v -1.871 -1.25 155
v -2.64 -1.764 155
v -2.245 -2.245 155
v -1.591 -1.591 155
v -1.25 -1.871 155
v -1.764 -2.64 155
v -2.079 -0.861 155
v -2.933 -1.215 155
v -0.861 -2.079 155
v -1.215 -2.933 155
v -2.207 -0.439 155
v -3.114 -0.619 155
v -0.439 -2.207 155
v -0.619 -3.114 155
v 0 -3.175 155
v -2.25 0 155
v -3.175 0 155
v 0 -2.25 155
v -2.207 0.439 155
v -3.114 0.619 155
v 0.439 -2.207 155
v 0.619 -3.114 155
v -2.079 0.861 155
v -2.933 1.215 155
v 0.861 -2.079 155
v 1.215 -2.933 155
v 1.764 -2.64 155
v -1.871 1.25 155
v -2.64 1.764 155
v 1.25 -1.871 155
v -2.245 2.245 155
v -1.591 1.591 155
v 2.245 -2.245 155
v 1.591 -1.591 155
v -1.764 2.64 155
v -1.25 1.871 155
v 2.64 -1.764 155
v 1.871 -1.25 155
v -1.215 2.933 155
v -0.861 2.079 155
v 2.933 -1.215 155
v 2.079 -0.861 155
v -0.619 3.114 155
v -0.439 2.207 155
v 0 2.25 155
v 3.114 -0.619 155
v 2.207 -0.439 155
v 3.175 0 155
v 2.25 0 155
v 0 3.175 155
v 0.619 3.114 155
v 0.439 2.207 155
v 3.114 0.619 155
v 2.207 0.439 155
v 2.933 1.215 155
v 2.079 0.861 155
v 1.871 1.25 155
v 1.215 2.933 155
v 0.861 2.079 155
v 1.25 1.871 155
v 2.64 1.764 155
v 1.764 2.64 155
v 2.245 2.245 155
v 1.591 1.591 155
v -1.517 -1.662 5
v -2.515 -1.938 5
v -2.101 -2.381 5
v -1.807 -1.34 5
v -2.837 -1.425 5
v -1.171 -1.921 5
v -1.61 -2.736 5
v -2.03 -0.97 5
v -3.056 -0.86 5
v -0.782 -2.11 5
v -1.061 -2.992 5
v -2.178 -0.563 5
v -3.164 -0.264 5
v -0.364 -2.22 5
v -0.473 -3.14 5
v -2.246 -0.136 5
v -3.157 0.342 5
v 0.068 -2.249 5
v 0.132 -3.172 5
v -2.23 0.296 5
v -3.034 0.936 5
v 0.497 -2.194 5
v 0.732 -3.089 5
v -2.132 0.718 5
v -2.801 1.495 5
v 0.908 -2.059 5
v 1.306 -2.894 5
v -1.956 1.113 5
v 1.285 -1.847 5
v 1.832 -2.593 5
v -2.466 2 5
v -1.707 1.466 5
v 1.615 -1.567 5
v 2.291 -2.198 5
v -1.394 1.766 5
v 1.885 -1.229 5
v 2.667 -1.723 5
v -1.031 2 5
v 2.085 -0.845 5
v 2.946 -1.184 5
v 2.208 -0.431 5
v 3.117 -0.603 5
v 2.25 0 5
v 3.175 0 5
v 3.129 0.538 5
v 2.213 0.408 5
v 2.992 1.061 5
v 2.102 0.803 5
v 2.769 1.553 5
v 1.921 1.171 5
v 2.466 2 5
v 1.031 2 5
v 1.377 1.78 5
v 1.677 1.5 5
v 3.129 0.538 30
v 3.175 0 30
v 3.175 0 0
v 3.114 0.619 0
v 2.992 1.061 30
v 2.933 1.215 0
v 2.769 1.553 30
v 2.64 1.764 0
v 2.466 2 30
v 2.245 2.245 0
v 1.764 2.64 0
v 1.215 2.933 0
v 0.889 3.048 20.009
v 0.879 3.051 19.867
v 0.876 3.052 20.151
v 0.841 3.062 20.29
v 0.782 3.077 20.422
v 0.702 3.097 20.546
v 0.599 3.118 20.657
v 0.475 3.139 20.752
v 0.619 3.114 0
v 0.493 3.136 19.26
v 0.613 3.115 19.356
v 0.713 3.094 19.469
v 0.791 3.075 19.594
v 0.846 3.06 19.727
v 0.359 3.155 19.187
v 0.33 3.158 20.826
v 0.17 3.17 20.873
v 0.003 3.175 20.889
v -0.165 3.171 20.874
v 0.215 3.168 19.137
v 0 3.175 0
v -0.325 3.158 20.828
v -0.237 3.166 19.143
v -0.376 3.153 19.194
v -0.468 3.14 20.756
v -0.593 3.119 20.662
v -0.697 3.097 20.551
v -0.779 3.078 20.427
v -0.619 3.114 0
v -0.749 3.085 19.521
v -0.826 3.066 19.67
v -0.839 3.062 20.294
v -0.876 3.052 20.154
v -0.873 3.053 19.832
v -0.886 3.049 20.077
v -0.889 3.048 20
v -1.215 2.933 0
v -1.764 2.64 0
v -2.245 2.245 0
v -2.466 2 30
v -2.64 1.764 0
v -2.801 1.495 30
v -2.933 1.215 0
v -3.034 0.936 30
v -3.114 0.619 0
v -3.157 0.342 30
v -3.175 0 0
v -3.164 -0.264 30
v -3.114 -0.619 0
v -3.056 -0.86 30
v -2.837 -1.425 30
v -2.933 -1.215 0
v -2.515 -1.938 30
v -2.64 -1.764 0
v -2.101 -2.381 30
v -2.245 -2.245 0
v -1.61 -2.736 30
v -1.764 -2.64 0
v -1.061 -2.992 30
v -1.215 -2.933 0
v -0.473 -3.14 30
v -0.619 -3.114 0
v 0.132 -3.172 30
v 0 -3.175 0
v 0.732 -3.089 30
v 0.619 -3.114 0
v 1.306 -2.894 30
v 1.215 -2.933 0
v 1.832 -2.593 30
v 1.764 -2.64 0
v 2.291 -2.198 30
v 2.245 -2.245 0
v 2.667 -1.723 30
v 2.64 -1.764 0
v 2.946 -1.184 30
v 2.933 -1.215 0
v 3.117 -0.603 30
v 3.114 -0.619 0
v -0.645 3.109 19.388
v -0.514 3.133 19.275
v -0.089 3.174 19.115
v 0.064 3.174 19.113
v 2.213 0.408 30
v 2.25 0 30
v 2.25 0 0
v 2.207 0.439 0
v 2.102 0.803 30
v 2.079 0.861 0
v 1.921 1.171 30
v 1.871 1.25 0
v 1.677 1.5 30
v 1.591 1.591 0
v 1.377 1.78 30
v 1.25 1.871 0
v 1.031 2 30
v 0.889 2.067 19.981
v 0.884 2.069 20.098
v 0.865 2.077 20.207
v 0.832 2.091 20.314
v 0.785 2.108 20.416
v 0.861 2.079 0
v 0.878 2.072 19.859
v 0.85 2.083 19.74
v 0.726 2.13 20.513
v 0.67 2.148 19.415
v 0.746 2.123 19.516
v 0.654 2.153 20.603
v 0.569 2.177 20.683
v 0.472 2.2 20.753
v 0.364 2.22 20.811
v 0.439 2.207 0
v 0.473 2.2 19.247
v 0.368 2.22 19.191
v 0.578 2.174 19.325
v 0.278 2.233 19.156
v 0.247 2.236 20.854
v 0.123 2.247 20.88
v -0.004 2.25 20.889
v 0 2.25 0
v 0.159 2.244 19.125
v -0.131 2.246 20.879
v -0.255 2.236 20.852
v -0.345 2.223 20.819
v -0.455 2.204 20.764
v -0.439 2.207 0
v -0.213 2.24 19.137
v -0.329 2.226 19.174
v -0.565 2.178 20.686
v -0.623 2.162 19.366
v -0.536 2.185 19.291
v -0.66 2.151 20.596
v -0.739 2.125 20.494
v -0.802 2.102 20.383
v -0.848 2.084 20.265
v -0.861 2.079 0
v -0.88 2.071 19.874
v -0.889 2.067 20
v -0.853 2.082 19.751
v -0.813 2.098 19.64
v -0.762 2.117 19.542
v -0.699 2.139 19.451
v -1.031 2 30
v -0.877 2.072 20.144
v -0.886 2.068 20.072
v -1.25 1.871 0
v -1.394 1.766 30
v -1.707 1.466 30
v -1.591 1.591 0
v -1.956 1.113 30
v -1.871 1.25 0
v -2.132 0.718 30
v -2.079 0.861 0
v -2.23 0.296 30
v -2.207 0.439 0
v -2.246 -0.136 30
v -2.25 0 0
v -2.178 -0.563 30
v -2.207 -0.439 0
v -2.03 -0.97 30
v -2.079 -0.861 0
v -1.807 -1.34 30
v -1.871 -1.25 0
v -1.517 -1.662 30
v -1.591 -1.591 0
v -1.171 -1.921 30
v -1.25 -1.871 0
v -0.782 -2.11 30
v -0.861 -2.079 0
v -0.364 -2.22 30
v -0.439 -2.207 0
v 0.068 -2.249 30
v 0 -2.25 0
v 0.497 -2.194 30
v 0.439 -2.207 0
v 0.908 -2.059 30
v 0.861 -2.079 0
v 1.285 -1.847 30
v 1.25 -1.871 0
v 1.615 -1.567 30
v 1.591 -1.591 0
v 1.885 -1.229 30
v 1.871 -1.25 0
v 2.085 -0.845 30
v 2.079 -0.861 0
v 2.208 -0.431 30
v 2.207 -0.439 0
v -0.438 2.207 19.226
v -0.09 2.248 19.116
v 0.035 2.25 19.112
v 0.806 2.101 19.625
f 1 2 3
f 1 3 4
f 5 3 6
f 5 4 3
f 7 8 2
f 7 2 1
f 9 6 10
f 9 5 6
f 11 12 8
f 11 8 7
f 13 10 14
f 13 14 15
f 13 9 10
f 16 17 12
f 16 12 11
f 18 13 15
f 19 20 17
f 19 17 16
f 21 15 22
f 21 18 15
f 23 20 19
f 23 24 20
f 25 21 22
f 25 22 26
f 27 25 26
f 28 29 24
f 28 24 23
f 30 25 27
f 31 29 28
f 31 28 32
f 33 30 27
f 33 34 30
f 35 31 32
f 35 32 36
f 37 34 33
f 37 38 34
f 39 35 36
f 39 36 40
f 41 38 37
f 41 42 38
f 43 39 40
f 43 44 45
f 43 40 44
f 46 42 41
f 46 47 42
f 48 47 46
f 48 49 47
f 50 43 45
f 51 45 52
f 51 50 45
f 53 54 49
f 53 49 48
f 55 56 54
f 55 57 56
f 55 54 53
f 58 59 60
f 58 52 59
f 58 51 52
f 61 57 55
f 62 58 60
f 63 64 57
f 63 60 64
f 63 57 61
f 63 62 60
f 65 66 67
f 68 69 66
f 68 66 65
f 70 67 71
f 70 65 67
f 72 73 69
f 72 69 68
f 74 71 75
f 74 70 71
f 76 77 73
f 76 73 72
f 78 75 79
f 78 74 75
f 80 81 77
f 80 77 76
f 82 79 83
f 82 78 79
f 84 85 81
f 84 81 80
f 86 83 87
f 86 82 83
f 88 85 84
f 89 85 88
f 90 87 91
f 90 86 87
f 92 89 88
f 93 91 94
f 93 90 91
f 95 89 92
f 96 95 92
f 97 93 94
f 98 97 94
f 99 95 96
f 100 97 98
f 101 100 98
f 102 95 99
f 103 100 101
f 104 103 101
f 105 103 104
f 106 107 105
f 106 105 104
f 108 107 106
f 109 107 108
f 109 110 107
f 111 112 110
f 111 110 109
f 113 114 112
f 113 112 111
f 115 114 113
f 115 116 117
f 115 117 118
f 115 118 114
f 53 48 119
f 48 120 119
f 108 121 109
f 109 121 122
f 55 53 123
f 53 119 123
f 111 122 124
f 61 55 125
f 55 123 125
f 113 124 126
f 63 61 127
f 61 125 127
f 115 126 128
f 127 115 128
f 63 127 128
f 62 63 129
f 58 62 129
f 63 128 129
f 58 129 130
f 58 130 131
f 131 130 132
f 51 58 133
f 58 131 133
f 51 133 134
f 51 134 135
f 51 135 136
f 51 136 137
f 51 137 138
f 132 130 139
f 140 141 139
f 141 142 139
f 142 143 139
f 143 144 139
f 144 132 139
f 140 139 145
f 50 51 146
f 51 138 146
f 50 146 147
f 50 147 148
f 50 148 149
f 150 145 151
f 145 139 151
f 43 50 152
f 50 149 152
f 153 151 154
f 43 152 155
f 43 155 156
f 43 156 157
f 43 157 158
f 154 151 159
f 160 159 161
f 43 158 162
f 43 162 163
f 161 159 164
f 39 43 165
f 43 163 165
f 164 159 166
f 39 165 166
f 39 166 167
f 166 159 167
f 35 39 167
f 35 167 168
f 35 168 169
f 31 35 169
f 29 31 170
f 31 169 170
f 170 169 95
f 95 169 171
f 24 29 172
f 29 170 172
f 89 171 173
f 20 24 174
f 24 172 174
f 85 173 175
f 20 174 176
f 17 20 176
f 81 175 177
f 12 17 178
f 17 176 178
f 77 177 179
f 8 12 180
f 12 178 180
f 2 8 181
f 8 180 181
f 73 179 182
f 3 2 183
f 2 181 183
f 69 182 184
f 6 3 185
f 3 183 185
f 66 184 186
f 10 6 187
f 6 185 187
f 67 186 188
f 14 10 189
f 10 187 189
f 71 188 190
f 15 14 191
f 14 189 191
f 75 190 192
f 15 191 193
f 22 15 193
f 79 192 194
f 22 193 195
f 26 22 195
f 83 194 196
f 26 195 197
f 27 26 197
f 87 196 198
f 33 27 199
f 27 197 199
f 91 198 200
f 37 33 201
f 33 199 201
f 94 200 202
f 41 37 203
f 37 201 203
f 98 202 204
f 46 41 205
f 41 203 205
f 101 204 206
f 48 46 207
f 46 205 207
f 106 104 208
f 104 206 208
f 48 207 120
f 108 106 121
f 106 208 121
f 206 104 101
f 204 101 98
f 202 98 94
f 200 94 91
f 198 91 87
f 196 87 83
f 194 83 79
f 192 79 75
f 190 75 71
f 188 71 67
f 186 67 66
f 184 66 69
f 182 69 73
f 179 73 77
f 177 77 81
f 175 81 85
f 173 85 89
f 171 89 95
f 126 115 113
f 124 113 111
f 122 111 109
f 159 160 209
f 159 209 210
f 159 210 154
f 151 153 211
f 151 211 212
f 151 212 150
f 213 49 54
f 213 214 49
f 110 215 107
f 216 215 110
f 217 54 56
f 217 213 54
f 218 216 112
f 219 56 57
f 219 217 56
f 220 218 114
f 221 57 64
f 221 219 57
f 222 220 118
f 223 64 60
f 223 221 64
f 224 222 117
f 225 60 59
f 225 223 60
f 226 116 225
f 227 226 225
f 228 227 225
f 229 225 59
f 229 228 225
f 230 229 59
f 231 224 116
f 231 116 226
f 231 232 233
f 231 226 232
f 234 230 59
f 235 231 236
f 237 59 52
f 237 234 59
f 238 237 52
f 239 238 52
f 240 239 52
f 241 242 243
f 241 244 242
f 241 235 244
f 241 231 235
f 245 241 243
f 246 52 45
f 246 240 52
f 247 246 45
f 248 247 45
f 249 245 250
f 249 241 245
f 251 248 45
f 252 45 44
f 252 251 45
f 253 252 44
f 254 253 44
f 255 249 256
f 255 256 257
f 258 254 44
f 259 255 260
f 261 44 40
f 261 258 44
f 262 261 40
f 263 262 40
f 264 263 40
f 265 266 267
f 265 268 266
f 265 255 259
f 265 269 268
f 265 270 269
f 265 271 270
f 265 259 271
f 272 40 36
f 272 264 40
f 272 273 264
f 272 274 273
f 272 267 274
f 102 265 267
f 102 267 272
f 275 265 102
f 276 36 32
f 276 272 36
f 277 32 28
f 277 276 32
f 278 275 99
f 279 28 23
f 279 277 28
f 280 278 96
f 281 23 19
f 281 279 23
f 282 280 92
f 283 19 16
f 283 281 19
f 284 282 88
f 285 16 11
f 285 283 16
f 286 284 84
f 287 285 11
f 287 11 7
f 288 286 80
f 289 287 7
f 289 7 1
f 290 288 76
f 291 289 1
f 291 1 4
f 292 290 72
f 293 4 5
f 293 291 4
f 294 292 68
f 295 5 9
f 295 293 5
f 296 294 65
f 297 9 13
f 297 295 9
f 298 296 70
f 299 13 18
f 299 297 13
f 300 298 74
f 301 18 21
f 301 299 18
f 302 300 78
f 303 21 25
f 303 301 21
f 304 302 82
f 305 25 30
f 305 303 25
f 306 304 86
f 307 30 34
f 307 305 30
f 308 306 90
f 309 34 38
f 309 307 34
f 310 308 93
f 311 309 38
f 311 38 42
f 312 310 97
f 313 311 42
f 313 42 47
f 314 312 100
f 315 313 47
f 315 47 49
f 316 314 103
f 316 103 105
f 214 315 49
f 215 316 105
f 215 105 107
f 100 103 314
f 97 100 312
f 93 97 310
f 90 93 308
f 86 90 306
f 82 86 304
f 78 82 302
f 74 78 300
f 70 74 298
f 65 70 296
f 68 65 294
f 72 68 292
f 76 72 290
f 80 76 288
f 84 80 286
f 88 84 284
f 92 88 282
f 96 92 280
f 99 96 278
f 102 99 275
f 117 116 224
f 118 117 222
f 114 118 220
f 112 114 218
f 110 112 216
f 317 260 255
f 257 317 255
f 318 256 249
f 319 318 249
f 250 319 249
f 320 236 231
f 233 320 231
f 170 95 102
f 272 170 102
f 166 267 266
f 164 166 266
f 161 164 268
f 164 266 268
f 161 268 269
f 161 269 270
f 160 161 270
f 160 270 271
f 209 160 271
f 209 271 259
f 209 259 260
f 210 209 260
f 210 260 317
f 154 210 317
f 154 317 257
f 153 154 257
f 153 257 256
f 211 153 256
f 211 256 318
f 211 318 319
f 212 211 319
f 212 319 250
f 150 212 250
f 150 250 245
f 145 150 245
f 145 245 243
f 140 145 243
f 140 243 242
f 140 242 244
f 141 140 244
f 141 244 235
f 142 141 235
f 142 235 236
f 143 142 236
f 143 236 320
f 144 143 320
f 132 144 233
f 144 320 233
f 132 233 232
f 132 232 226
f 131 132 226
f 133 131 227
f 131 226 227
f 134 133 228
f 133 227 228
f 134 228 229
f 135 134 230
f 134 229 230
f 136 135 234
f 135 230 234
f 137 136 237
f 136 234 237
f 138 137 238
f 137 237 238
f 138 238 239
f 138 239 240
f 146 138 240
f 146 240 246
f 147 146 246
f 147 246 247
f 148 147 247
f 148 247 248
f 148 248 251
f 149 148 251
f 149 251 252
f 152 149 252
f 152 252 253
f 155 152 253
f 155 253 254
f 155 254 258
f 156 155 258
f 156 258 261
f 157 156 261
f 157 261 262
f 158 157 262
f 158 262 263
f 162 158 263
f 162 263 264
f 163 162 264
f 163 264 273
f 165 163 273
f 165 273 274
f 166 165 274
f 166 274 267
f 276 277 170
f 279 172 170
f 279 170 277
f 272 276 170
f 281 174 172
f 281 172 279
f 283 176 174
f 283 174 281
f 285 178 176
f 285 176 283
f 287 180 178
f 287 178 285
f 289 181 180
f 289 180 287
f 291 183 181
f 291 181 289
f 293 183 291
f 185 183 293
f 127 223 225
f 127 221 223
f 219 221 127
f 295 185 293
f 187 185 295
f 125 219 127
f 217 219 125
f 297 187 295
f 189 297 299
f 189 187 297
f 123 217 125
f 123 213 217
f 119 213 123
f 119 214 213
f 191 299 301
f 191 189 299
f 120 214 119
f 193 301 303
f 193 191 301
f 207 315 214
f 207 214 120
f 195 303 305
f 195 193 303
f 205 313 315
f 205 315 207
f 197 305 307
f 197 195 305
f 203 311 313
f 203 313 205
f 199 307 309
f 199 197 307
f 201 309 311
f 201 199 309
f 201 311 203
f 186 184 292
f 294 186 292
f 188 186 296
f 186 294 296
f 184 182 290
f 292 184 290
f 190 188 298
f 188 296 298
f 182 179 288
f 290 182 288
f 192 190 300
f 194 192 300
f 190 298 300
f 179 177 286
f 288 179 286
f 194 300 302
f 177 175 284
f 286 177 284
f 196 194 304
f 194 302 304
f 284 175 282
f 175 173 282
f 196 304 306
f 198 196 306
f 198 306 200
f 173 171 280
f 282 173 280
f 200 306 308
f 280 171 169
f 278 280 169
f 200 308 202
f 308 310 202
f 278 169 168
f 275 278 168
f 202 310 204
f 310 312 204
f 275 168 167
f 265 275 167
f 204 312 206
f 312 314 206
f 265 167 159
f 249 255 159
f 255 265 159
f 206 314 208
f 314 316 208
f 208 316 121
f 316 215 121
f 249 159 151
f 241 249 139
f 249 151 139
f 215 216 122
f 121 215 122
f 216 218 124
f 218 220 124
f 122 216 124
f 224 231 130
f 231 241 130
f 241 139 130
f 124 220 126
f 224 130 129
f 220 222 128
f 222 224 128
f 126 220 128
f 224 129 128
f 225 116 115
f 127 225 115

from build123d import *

# Parameters (mm, degrees)
SKETCH1_R               = 3.175
SKETCH1_R_2             = 2.25
BOSS_EXTRUDE1_DEPTH     = 35
SKETCH2_W               = 13.029993618
SKETCH2_H               = 25
CUT_EXTRUDE1_DEPTH      = 2
CUT_EXTRUDE1_DEPTH_BACK = 5
SKETCH3_R               = 0.889
F_2_56_HOLE_DEPTH       = 3
SKETCH4_R               = 3.175
SKETCH4_R_2             = 2.25
BOSS_EXTRUDE2_DEPTH     = 120


with BuildPart() as part:
    # Sketch1 → Boss-Extrude1 (new body)
    with BuildSketch(Plane.XY):
        Circle(SKETCH1_R)
        Circle(SKETCH1_R_2, mode=Mode.SUBTRACT)
    extrude(amount=BOSS_EXTRUDE1_DEPTH)

    # Sketch2 → Cut-Extrude1 (cut, two sides)
    with BuildSketch(Plane(origin=(0, 0, 0), x_dir=(1, 0, 0), z_dir=(0, 1, 0))) as cut_extrude1_sk:
        with Locations((0.986854582, -17.5)):
            Rectangle(SKETCH2_W, SKETCH2_H)
    extrude(amount=CUT_EXTRUDE1_DEPTH, mode=Mode.SUBTRACT)
    extrude(cut_extrude1_sk.sketch, amount=-CUT_EXTRUDE1_DEPTH_BACK, mode=Mode.SUBTRACT)

    # Sketch3 → 2-56 hole (cut)
    with BuildSketch(Plane(origin=(0, 2, 0), x_dir=(-1, 0, 0), z_dir=(0, -1, 0))):
        with Locations((0, -20)):
            Circle(SKETCH3_R)
    extrude(amount=-F_2_56_HOLE_DEPTH, mode=Mode.SUBTRACT)

    # Sketch4 → Boss-Extrude2 (add)
    with BuildSketch(Plane.XY.offset(35)):
        Circle(SKETCH4_R)
        Circle(SKETCH4_R_2, mode=Mode.SUBTRACT)
    extrude(amount=BOSS_EXTRUDE2_DEPTH)


solid = part.part
